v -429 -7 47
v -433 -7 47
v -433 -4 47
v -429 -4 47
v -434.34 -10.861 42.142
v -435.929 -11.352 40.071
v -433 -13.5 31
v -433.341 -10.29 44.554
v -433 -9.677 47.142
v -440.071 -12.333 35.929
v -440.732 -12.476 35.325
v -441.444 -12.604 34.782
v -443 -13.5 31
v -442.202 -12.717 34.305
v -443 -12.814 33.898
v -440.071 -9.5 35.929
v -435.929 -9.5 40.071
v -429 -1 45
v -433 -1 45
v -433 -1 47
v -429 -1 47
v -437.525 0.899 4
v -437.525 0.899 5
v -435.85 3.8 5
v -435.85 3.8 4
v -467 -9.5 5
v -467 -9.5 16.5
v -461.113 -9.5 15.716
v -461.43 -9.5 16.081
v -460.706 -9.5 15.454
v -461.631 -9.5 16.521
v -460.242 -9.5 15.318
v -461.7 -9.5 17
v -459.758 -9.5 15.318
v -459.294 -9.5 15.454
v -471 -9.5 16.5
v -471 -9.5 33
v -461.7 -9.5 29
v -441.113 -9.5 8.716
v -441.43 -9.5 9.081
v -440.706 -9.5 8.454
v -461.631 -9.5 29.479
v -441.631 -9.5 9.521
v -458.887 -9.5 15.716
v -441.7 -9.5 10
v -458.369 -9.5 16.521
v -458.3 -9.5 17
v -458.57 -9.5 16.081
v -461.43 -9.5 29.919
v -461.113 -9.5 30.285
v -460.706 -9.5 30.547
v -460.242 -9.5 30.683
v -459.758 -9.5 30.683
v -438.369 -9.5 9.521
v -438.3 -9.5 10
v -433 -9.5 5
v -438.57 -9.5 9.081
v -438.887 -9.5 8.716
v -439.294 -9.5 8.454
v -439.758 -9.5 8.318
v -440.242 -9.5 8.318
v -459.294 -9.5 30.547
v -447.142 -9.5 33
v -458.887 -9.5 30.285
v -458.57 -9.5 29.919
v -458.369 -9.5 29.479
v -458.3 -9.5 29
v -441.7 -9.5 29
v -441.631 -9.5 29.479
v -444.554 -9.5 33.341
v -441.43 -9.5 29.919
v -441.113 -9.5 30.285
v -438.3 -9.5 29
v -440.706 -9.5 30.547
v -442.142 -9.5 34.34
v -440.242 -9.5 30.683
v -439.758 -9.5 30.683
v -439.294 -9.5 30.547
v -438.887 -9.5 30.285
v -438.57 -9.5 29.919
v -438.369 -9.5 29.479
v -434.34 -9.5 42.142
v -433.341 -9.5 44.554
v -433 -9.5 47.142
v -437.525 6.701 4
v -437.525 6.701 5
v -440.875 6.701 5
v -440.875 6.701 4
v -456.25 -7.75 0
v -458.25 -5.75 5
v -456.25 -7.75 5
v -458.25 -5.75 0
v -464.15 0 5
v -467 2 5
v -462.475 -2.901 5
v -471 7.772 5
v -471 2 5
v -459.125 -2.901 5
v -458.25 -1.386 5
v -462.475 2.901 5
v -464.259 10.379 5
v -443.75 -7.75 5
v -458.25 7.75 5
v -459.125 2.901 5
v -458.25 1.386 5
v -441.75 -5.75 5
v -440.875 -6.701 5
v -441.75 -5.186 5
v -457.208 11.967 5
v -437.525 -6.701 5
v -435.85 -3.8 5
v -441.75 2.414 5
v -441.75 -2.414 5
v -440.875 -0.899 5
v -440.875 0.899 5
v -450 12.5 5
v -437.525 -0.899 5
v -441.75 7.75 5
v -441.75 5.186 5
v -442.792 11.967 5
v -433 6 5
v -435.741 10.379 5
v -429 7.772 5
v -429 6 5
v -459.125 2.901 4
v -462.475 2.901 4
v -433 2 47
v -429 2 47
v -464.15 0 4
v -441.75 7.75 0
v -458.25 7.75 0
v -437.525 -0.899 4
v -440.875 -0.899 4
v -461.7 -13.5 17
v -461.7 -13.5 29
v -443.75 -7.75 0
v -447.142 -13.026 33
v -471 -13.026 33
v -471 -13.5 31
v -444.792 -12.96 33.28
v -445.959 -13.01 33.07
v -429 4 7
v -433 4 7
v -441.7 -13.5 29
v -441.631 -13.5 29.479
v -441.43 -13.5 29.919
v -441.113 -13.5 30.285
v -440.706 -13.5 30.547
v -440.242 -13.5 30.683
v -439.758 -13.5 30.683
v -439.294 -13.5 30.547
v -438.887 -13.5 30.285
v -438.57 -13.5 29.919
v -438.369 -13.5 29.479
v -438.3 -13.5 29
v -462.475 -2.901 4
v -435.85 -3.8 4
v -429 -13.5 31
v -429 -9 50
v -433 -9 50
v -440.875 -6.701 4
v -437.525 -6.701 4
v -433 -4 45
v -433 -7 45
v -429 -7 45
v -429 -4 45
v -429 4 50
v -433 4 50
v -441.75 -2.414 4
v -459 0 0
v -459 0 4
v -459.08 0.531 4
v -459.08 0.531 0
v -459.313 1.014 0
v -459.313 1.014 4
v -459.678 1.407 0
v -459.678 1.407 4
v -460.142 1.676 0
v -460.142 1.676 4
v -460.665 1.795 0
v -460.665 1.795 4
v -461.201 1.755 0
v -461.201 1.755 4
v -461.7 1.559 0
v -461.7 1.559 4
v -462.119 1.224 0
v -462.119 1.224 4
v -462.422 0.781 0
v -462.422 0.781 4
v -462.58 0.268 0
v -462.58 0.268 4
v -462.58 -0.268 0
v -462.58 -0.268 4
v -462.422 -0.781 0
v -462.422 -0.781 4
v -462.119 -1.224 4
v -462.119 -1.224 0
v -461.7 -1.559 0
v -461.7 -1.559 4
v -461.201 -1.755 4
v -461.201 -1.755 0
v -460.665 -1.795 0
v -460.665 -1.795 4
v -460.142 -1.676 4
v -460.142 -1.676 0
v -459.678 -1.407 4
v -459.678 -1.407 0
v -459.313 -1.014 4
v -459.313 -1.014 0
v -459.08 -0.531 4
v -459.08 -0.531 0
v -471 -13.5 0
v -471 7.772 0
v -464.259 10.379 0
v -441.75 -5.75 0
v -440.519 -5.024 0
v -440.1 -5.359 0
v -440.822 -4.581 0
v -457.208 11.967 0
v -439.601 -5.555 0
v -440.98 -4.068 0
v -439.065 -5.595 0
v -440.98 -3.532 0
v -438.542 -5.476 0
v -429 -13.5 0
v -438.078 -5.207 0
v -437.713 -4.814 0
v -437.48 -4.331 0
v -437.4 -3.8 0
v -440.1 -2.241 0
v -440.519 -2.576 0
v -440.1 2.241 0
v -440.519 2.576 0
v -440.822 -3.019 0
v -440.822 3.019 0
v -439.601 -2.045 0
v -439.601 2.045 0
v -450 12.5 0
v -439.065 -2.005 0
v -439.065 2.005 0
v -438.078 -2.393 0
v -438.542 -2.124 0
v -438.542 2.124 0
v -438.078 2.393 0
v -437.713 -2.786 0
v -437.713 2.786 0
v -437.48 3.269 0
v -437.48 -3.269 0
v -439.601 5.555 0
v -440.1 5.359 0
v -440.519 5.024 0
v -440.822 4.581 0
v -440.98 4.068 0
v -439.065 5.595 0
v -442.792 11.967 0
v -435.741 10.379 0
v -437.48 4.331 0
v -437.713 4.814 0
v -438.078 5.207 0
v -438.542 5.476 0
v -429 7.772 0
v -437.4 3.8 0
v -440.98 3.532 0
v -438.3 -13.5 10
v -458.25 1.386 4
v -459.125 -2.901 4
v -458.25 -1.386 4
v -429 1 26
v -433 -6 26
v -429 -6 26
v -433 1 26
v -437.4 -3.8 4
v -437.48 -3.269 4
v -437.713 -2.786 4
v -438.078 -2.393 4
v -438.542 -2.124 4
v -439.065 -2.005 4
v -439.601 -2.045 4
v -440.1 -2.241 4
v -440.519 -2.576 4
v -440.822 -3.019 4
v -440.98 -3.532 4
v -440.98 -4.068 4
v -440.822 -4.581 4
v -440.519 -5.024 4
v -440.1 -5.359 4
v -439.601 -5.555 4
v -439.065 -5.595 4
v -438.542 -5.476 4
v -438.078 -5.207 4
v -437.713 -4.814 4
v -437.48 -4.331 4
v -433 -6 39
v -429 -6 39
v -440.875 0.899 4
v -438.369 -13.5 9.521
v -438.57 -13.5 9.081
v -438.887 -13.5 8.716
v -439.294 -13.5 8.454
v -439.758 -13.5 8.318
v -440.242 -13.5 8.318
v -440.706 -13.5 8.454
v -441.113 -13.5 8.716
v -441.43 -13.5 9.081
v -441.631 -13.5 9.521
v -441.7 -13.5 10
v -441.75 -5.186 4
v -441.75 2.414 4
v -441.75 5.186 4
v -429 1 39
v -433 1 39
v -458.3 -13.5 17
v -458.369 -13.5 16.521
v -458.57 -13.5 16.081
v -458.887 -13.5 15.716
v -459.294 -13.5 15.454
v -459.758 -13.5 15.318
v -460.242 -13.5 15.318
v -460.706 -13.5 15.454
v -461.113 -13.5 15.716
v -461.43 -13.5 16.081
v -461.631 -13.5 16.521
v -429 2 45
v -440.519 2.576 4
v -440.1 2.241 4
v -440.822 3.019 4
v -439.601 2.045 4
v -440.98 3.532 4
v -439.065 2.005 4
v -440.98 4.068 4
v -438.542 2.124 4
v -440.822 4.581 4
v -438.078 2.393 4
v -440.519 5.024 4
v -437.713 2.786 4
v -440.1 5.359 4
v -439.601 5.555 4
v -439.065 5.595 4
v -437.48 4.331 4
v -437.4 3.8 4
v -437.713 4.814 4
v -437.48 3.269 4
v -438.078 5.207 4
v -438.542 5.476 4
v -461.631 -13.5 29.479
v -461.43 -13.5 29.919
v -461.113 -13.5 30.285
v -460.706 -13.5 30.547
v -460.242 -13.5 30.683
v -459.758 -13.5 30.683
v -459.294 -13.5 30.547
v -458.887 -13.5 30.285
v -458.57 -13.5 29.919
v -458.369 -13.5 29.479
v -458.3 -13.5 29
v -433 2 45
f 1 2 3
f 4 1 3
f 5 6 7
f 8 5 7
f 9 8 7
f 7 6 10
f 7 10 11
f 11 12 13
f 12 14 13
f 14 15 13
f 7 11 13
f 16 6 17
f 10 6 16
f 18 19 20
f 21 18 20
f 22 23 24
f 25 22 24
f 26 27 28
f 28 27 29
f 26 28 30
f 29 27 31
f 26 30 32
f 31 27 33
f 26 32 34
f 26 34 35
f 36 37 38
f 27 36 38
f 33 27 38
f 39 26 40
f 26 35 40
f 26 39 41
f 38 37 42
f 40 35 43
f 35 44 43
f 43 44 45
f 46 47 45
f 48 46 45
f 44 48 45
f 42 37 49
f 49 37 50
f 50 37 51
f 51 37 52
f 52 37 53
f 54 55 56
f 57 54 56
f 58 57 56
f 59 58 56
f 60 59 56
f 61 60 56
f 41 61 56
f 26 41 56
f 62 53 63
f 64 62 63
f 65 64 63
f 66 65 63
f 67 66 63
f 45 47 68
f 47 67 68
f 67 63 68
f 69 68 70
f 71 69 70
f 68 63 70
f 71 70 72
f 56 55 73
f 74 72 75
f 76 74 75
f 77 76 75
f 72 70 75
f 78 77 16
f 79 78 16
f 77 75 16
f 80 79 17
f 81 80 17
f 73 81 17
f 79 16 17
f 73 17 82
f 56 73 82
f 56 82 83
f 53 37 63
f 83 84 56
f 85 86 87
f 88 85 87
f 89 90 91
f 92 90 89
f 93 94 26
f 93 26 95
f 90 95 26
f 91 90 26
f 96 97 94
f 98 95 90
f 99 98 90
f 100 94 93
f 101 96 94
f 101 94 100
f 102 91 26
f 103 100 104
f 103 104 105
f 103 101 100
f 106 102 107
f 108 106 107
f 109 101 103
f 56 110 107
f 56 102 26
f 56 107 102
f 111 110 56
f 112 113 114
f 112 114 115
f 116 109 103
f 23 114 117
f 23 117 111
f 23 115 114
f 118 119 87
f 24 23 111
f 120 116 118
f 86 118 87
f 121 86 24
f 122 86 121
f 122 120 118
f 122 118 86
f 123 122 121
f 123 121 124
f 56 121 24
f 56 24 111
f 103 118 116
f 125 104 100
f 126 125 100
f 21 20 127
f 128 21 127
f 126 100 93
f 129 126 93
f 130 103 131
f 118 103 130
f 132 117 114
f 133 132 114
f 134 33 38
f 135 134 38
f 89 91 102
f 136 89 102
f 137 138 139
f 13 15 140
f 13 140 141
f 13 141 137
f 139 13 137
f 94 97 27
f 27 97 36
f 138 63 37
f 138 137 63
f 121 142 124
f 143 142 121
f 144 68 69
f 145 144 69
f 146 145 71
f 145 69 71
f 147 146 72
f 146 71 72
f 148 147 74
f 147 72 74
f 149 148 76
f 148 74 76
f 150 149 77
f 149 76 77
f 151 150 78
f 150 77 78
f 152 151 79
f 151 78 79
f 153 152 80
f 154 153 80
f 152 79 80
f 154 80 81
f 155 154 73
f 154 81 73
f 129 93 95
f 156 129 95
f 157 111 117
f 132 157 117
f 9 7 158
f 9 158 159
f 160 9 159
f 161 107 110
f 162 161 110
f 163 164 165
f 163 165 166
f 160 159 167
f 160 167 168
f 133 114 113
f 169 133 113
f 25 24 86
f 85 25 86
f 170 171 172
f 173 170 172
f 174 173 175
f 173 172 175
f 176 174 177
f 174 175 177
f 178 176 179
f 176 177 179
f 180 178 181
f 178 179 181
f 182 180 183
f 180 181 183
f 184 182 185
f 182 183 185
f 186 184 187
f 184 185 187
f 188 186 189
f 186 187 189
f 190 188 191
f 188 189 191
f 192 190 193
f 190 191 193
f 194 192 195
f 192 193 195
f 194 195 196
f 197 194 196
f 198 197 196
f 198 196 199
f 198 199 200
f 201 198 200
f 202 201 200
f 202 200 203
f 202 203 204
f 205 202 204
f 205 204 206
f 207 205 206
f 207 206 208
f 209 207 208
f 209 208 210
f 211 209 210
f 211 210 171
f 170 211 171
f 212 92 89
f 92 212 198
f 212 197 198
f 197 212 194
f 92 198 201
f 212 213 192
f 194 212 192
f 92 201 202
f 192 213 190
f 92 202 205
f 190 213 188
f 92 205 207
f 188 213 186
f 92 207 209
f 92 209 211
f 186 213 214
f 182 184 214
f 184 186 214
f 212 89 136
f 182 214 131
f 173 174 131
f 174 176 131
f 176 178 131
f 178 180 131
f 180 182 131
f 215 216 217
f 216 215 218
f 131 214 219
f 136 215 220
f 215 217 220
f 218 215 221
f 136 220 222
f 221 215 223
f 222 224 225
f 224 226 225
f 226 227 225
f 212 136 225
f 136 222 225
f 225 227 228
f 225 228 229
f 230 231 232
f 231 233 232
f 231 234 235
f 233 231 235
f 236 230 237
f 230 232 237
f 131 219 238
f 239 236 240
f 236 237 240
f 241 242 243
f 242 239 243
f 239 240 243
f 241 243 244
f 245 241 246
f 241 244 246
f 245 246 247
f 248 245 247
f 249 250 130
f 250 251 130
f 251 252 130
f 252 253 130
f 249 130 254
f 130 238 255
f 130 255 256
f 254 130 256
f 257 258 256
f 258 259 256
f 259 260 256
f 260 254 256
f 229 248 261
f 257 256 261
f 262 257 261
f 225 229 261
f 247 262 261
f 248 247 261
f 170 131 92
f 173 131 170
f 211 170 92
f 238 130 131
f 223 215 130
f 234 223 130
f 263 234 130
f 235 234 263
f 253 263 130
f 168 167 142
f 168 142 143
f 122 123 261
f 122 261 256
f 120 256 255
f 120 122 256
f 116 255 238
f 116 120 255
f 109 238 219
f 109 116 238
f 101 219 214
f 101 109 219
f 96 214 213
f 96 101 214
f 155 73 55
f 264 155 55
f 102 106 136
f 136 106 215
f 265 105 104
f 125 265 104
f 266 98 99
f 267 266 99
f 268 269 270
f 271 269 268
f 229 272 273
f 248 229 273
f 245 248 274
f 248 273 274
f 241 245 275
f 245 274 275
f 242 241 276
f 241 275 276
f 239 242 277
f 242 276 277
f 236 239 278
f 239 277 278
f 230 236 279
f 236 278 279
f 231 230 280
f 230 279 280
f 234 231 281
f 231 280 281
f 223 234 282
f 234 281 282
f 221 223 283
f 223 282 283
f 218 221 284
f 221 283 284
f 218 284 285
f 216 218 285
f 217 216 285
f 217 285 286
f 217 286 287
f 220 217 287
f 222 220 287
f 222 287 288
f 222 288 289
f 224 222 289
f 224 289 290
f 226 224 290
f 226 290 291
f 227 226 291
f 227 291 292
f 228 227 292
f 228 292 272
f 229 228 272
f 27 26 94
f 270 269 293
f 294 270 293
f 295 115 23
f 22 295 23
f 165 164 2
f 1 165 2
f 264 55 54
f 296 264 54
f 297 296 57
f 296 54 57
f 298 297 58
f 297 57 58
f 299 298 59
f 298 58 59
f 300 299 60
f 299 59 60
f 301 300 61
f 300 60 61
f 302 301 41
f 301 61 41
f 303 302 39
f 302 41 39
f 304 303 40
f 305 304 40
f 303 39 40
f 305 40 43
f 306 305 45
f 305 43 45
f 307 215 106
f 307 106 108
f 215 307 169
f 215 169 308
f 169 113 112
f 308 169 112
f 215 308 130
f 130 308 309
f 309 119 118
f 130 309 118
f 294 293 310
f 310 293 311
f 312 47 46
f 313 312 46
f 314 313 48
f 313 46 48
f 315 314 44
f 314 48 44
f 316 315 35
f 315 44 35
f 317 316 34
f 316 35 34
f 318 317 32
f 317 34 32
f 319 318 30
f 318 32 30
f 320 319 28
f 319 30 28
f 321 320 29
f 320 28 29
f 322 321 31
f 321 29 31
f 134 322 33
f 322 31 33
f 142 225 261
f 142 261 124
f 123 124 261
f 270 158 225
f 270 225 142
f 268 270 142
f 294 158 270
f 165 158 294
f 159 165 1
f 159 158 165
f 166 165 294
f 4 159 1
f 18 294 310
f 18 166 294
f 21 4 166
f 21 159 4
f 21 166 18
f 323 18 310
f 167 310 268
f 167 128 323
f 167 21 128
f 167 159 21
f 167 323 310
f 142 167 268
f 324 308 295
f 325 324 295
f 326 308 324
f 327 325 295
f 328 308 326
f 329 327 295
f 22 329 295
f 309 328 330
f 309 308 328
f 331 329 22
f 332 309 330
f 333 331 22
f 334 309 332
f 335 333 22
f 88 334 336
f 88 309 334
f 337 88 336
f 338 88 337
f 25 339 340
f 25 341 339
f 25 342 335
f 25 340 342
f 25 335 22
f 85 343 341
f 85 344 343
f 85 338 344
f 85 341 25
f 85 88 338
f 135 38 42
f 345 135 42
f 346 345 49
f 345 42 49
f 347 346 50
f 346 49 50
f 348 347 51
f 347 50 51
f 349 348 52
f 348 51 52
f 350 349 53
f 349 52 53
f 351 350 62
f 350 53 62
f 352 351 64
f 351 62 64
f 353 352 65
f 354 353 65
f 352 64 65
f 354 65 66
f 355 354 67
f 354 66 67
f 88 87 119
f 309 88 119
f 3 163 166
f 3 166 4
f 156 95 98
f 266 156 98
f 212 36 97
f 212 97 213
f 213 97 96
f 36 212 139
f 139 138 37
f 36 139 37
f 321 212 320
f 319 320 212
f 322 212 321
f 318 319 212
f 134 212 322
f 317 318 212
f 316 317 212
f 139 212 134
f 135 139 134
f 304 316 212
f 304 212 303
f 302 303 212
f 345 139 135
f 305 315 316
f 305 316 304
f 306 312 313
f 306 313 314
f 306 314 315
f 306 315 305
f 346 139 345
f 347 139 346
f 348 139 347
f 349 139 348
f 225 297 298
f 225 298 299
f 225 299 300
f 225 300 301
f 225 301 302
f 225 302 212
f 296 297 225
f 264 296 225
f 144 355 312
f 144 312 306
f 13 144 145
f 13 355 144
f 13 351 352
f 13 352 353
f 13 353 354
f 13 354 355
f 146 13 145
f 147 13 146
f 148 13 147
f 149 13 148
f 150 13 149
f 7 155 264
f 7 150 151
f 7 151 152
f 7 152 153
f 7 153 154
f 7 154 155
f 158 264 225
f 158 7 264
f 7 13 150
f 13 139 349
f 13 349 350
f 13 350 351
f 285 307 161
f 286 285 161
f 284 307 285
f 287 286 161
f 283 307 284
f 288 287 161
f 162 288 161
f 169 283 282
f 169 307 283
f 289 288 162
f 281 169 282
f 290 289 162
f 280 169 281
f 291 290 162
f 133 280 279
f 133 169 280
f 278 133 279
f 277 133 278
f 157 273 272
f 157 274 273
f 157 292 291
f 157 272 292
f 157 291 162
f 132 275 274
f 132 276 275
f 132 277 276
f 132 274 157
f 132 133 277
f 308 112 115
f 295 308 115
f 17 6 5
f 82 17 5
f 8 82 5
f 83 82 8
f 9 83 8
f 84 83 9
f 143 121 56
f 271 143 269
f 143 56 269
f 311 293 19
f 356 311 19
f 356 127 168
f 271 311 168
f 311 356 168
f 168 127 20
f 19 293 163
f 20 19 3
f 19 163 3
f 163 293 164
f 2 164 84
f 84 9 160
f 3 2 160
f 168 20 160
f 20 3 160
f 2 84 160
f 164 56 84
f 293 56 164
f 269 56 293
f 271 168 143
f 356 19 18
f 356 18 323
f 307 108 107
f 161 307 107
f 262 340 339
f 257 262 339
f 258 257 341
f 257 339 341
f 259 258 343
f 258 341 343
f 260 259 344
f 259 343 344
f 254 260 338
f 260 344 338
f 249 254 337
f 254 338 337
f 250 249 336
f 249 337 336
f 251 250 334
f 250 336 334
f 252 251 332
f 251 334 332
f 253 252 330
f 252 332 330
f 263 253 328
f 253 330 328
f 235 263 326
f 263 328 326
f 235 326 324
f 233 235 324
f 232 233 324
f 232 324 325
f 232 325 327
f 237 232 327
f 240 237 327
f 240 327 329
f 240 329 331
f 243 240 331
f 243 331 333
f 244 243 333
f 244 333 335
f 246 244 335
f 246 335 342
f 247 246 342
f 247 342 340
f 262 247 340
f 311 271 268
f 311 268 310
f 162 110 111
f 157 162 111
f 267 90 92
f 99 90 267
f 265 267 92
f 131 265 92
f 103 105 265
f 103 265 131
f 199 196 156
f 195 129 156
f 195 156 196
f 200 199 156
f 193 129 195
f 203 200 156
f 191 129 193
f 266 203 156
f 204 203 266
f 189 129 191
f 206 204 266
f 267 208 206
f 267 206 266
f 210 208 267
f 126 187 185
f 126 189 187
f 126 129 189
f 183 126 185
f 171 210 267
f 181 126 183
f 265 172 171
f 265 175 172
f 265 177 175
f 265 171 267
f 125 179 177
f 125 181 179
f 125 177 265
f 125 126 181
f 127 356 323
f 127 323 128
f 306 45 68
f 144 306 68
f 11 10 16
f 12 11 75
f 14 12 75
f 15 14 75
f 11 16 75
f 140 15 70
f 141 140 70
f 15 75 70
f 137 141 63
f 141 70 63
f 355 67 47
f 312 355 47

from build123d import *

# Parameters (mm, degrees)
EXTRUDE_START               = -443
EXTRUDE_1_DEPTH             = 10
EXTRUDE_START_2             = -345
EXTRUDE_1_2_OUTLINE_W       = 17
EXTRUDE_1_2_OUTLINE_H       = 4.342105263
EXTRUDE_1_2_DEPTH           = 8.417172155
EXTRUDE_2_DEPTH             = 28
EXTRUDE_3_DEPTH             = 1.157894737
EXTRUDE_4_DEPTH             = 4
SKETCH_5_W                  = 4
SKETCH_5_H                  = 45
EXTRUDE_5_DEPTH             = 13
EXTRUDE_6_DEPTH             = 5
THICKEN_START               = -471
THICKEN_1_DEPTH             = 4
SKETCH_7_W                  = 13
SKETCH_7_H                  = 7
CUT_EXTRUDE_1_DEPTH         = 65.235893393
SKETCH_8_W                  = 2
SKETCH_8_H                  = 3
CUT_EXTRUDE_2_DEPTH         = 65.235893393
SKETCH_9_W                  = 2
SKETCH_9_H                  = 3
CUT_EXTRUDE_3_DEPTH         = 65.235893393
CUT_EXTRUDE_4_DEPTH         = 475.157146946
CUT_EXTRUDE_5_DEPTH         = 475.157146946
SKETCH_12_W                 = 16.5
SKETCH_12_H                 = 15.5
CUT_EXTRUDE_6_DEPTH         = 474.337353269
CUT_EXTRUDE_7_DEPTH         = 1
CUT_EXTRUDE_8_DEPTH         = 1
CUT_EXTRUDE_9_DEPTH         = 1
HOLE_WIZARD_3_6_3_6_1_D     = 3.6
HOLE_WIZARD_3_6_3_6_1_DEPTH = 50
CHAMFER_1_SIZE              = 2
FILLET_1_R                  = 10


with BuildPart() as part:
    # 凸台-拉伸1: read off the stored shape, not the designer's step
    # 凸台-拉伸1 outline → 凸台-拉伸1 (new body)
    with BuildSketch(Plane.YZ.offset(EXTRUDE_START)):
        Polygon((-10.657894737, 43), (-13.5, 31), (-13.5, 5), (-10.657894737, 5), align=None)
    extrude(amount=EXTRUDE_1_DEPTH)

    # Extrude 1 2 outline → Extrude 1 2 (cut)
    with BuildSketch(Plane(origin=(0, 0, 0), x_dir=(0.707106781186548, 0, 0.707106781186547), z_dir=(0.707106781186547, 0, -0.707106781186548)).offset(EXTRUDE_START_2)):
        with Locations((-282.5, 12.828947369)):
            Rectangle(EXTRUDE_1_2_OUTLINE_W, EXTRUDE_1_2_OUTLINE_H)
    extrude(amount=EXTRUDE_1_2_DEPTH, mode=Mode.SUBTRACT)

    # 草图2 → 凸台-拉伸2 (add)
    with BuildSketch(Plane.ZY.offset(443)):
        Polygon((5, -10.657894737), (33, -10.657894737), (33, -13.026315789), (31, -13.5), (5, -13.5), align=None)
    extrude(amount=EXTRUDE_2_DEPTH)

    # 草图3 → 凸台-拉伸3 (add)
    with BuildSketch(Plane(origin=(0, -10.657894737, 0), x_dir=(-1, 0, 0), z_dir=(0, 1, 0))):
        Polygon((471, 5), (433, 5), (433, 43), (443, 33), (471, 33), align=None)
    extrude(amount=EXTRUDE_3_DEPTH)

    # 草图4 → 凸台-拉伸4 (add)
    with BuildSketch(Plane(origin=(-433, 0, 0), x_dir=(0, 0, -1), z_dir=(1, 0, 0))):
        Polygon((-50, -9), (-5, -9), (-5, -13.5), (-31, -13.5), align=None)
    extrude(amount=EXTRUDE_4_DEPTH)

    # 草图5 → 凸台-拉伸5 (add)
    with BuildSketch(Plane(origin=(0, -9, 0), x_dir=(-1, 0, 0), z_dir=(0, 1, 0))):
        with Locations((431, 27.5)):
            Rectangle(SKETCH_5_W, SKETCH_5_H)
    extrude(amount=EXTRUDE_5_DEPTH)

    # 草图6 → 凸台-拉伸6 (add)
    with BuildSketch(Plane(origin=(0, 0, 5), x_dir=(-1, 0, 0), z_dir=(0, 0, -1))):
        with BuildLine():
            Line((429, -13.5), (429, 7.771887242))
            ThreePointArc((429, 7.771887242), (450, 12.5), (471, 7.771887242))
            Line((471, 7.771887242), (471, -13.5))
            Line((471, -13.5), (429, -13.5))
        make_face()
    extrude(amount=EXTRUDE_6_DEPTH)

    # 加厚1: read off the stored shape, not the designer's step
    # 加厚1 outline → 加厚1 (add)
    with BuildSketch(Plane.YZ.offset(THICKEN_START)):
        Polygon((2, 5), (-9.5, 16.5), (-9.5, 5), align=None)
    extrude(amount=THICKEN_1_DEPTH)

    # 草图7 → 切除-拉伸1 (cut, through all)
    with BuildSketch(Plane.ZY.offset(433)):
        with Locations((32.5, -2.5)):
            Rectangle(SKETCH_7_W, SKETCH_7_H)
    extrude(amount=-CUT_EXTRUDE_1_DEPTH, mode=Mode.SUBTRACT)

    # 草图8 → 切除-拉伸2 (cut, through all)
    with BuildSketch(Plane.ZY.offset(433)):
        with Locations((46, 0.5)):
            Rectangle(SKETCH_8_W, SKETCH_8_H)
    extrude(amount=-CUT_EXTRUDE_2_DEPTH, mode=Mode.SUBTRACT)

    # 草图9 → 切除-拉伸3 (cut, through all)
    with BuildSketch(Plane.ZY.offset(433)):
        with Locations((46, -5.5)):
            Rectangle(SKETCH_9_W, SKETCH_9_H)
    extrude(amount=-CUT_EXTRUDE_3_DEPTH, mode=Mode.SUBTRACT)

    # 草图10 → 切除-拉伸4 (cut, through all)
    with BuildSketch(Plane(origin=(0, -9.5, 0), x_dir=(-1, 0, 0), z_dir=(0, 1, 0))):
        with BuildLine():
            Line((438.3, 29.000393674), (438.3, 10.000393674))
            ThreePointArc((438.3, 10.000393674), (440, 8.300393674), (441.7, 10.000393674))
            Line((441.7, 10.000393674), (441.7, 29.000393674))
            ThreePointArc((441.7, 29.000393674), (440, 30.700393674), (438.3, 29.000393674))
        make_face()
    extrude(amount=-CUT_EXTRUDE_4_DEPTH, mode=Mode.SUBTRACT)

    # 草图11 → 切除-拉伸5 (cut, through all)
    with BuildSketch(Plane(origin=(0, -9.5, 0), x_dir=(-1, 0, 0), z_dir=(0, 1, 0))):
        with BuildLine():
            Line((458.3, 29.000393674), (458.3, 17.000393674))
            ThreePointArc((458.3, 17.000393674), (460, 15.300393674), (461.7, 17.000393674))
            Line((461.7, 17.000393674), (461.7, 29.000393674))
            ThreePointArc((461.7, 29.000393674), (460, 30.700393674), (458.3, 29.000393674))
        make_face()
    extrude(amount=-CUT_EXTRUDE_5_DEPTH, mode=Mode.SUBTRACT)

    # 草图12 → 切除-拉伸6 (cut, through all)
    with BuildSketch(Plane.XY.offset(5)):
        with Locations((-450, 0)):
            Rectangle(SKETCH_12_W, SKETCH_12_H)
    extrude(amount=-CUT_EXTRUDE_6_DEPTH, mode=Mode.SUBTRACT)

    # 草图13 → 切除-拉伸7 (cut)
    with BuildSketch(Plane.XY.offset(5)):
        Polygon((-458.25, 1.385640646), (-459.125, 2.901185103), (-462.475, 2.901185103), (-464.15, 0), (-462.475, -2.901185103), (-459.125, -2.901185103), (-458.25, -1.385640646), align=None)
    extrude(amount=-CUT_EXTRUDE_7_DEPTH, mode=Mode.SUBTRACT)

    # 草图14 → 切除-拉伸8 (cut)
    with BuildSketch(Plane.XY.offset(5)):
        Polygon((-441.75, 2.414359354), (-440.875, 0.898814897), (-437.525, 0.898814897), (-435.85, 3.8), (-437.525, 6.701185103), (-440.875, 6.701185103), (-441.75, 5.185640646), align=None)
    extrude(amount=-CUT_EXTRUDE_8_DEPTH, mode=Mode.SUBTRACT)

    # 草图15 → 切除-拉伸9 (cut)
    with BuildSketch(Plane.XY.offset(5)):
        Polygon((-441.75, -5.185640646), (-440.875, -6.701185103), (-437.525, -6.701185103), (-435.85, -3.8), (-437.525, -0.898814897), (-440.875, -0.898814897), (-441.75, -2.414359354), align=None)
    extrude(amount=-CUT_EXTRUDE_9_DEPTH, mode=Mode.SUBTRACT)

    # Ø3.6 (3.6) 直径孔1
    with Locations(Plane(origin=(0, 0, 0), x_dir=(-1, 0, 0), z_dir=(0, 0, -1))):
        with Locations((439.2, -3.8), (439.2, 3.8), (460.8, 0)):
            Hole(HOLE_WIZARD_3_6_3_6_1_D / 2, depth=HOLE_WIZARD_3_6_3_6_1_DEPTH)

    # 倒角1
    chamfer_1_edges = [part.edges().sort_by_distance(p)[0] for p in [
        (-431, 4, 5),
        (-441.75, -7.75, 2.5),
        (-458.25, -7.75, 2.5),
    ]]
    chamfer(chamfer_1_edges, length=CHAMFER_1_SIZE)

    # 圆角1
    fillet_1_edges = [part.edges().sort_by_distance(p)[0] for p in [
        (-443, -11.842105263, 33),
        (-433, -10.078947368, 43),
    ]]
    fillet(fillet_1_edges, radius=FILLET_1_R)


solid = part.part
